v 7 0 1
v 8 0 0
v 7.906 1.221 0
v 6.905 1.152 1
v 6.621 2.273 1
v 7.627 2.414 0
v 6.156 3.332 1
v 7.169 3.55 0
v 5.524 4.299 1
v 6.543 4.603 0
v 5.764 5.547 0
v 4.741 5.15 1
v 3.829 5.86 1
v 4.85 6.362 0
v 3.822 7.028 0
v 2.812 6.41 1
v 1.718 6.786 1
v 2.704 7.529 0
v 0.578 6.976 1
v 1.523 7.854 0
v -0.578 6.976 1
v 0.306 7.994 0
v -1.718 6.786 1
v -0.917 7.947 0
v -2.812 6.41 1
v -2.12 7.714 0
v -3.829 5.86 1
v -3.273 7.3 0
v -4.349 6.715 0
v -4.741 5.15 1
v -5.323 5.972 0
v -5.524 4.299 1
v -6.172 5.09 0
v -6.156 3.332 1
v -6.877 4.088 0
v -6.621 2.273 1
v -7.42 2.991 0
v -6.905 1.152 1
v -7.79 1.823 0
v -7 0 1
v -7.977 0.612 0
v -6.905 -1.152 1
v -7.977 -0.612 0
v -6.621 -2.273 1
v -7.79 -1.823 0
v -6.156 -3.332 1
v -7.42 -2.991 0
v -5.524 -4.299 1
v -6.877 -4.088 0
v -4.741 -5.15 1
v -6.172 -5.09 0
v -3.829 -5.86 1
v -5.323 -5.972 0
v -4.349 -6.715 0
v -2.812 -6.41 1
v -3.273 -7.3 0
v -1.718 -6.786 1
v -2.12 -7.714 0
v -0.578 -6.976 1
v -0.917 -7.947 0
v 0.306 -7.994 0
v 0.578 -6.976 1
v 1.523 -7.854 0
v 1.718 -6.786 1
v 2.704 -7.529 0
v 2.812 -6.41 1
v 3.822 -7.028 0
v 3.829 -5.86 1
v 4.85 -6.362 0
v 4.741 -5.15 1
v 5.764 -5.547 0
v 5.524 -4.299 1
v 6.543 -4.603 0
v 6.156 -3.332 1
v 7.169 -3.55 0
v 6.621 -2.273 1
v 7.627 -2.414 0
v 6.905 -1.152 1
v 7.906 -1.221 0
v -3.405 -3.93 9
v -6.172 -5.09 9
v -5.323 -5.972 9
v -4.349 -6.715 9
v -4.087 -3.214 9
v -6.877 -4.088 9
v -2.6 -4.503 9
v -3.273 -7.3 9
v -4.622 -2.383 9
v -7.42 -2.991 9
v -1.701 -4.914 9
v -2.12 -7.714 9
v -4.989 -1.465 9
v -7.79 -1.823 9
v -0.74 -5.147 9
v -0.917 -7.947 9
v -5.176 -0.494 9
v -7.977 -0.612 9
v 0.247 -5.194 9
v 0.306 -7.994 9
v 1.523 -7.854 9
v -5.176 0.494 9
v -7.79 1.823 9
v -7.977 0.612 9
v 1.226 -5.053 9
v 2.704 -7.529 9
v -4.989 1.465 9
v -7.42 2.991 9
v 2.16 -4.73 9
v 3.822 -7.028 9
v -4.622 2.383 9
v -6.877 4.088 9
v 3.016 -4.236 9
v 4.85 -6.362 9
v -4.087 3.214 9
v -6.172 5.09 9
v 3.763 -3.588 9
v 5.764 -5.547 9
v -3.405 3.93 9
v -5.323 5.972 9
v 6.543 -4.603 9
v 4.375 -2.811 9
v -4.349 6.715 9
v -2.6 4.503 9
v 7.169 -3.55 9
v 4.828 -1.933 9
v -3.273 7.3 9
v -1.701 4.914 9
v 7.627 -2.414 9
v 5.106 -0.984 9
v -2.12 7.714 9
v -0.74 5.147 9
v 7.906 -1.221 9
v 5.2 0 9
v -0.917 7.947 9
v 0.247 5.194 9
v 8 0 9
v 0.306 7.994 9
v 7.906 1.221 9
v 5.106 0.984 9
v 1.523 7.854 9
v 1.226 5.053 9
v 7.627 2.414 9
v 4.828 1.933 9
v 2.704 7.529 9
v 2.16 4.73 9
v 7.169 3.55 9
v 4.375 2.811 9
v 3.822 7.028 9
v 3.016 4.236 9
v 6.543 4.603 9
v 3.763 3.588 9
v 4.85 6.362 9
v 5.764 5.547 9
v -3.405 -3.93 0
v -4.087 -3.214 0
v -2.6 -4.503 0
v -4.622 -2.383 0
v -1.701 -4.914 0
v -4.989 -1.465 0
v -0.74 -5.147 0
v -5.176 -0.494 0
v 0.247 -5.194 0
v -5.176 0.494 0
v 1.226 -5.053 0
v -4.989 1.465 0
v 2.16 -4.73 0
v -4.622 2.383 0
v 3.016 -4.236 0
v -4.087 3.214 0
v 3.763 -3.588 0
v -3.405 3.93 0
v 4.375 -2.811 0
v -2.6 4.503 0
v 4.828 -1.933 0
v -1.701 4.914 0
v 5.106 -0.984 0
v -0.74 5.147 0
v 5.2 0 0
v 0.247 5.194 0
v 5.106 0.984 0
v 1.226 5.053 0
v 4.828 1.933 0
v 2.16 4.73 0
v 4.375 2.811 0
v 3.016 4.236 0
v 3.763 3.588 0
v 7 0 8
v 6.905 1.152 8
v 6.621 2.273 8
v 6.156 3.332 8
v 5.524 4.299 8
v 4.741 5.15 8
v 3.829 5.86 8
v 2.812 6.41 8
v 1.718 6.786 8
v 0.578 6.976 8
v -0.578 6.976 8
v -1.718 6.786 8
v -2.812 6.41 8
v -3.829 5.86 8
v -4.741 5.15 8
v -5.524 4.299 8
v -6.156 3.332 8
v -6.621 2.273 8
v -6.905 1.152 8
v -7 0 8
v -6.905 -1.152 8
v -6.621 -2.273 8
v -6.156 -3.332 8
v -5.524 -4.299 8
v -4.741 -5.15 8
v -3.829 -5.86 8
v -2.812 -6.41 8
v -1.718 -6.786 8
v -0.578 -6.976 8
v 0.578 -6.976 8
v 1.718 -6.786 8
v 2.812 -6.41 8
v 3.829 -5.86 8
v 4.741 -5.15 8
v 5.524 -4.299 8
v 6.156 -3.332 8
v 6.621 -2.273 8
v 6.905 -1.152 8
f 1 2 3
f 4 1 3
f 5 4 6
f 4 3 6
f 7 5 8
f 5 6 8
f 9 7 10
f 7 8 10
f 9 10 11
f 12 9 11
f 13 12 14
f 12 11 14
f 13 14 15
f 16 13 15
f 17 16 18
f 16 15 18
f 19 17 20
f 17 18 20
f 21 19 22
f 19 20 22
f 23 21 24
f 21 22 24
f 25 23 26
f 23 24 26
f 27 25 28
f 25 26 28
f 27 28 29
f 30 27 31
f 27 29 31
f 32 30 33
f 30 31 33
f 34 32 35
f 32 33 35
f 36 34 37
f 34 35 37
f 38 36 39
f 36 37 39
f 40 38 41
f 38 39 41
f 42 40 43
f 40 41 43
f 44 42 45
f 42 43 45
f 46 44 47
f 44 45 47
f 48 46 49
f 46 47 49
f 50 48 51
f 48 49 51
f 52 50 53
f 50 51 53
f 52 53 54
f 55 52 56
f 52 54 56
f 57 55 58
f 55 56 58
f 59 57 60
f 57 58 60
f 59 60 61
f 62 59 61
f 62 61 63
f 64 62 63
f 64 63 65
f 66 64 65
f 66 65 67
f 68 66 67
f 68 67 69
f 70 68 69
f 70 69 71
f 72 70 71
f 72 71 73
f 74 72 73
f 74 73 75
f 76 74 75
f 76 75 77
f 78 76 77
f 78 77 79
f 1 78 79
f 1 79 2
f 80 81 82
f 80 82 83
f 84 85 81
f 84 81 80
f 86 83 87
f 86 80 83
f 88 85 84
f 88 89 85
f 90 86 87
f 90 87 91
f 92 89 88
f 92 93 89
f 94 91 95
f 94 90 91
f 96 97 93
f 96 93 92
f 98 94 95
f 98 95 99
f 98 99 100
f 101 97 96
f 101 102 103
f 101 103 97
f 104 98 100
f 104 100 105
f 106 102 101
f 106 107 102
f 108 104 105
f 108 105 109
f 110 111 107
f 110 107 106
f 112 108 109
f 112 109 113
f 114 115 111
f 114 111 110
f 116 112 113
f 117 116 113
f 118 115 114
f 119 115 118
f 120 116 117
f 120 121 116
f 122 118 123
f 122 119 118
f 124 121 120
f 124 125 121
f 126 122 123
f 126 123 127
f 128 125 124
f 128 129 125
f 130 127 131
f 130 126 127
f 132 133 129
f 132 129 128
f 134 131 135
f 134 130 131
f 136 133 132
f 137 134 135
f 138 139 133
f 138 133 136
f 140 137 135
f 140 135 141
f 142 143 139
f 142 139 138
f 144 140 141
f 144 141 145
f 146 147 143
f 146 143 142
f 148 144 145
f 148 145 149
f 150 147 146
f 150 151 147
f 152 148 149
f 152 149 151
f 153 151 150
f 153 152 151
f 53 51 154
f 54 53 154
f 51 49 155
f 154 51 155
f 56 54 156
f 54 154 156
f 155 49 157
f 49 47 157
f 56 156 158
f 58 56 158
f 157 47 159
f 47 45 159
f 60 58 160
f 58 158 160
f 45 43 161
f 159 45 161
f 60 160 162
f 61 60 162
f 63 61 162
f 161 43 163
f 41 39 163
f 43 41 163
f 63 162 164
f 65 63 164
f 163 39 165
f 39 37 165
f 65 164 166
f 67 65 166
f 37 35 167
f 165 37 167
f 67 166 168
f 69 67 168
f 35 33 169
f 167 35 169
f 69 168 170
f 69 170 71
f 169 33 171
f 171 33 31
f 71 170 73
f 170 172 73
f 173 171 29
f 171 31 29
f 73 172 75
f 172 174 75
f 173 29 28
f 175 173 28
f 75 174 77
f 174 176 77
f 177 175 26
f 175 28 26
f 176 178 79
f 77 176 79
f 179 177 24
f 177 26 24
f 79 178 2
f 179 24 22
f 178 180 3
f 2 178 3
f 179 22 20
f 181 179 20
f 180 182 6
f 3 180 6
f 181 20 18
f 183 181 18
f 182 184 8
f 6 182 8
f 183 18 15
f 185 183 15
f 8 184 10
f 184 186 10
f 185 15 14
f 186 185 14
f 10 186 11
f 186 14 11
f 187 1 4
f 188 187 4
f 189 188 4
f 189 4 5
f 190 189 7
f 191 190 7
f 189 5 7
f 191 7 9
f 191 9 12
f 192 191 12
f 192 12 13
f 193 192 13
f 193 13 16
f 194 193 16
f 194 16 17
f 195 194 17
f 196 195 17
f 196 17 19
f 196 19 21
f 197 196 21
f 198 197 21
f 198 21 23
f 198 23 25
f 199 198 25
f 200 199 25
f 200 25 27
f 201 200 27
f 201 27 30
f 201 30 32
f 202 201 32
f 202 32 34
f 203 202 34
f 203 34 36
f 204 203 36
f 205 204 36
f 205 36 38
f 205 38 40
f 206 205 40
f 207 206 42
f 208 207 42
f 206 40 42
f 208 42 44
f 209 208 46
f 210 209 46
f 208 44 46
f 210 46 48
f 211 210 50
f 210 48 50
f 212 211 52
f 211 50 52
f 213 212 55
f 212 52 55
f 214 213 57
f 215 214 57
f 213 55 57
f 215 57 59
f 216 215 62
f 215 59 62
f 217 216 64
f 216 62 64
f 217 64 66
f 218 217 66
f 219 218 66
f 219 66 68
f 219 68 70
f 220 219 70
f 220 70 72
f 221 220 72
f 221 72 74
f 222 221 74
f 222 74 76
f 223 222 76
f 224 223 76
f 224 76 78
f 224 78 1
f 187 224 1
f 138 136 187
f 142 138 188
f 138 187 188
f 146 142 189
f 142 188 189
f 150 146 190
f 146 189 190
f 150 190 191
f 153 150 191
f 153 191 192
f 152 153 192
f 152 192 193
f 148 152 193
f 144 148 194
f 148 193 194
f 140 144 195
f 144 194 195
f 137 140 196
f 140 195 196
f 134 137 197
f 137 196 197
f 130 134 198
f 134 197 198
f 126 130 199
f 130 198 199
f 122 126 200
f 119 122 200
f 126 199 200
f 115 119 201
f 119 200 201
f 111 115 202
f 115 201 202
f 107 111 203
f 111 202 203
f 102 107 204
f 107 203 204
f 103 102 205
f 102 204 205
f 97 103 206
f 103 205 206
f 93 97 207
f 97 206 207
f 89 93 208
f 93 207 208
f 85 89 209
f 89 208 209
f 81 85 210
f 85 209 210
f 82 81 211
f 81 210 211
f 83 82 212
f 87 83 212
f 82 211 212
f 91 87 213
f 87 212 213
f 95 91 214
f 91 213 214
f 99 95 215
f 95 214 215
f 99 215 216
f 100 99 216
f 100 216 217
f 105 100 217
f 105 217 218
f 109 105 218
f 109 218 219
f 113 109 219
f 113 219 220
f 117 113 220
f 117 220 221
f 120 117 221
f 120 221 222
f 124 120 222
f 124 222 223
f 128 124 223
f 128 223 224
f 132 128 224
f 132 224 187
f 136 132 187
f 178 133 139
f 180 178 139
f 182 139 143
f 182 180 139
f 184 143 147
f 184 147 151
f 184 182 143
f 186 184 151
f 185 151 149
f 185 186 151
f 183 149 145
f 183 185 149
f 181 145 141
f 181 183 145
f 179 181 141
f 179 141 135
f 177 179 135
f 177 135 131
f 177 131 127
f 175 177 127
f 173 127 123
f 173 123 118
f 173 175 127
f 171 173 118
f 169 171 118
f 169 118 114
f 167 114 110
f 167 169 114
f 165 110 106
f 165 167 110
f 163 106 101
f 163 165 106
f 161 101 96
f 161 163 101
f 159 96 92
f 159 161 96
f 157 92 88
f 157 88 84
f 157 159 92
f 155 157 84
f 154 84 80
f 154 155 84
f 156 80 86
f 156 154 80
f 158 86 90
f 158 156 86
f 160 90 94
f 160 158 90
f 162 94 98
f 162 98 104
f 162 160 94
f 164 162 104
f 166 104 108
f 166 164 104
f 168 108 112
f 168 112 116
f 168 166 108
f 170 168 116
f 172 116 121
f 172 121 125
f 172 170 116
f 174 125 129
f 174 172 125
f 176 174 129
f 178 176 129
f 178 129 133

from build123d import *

# Parameters (mm, degrees)
F0_R     = 7
F0_R_2   = 5.2
F1_DEPTH = 9
F0_R_3   = 8
F2_DEPTH = 1
F3_R     = 8
F3_R_2   = 7
F4_DEPTH = 1
F5_SIZE  = 0.99999


# Not quite as in the source:
# - a fillet or chamfer is up to 0.001 mm smaller than in the source, because OpenCascade refuses the exact size


with BuildPart() as f1:
    # F0 (on Top) → F1 (new body)
    with BuildSketch(Plane.XY):
        Circle(F0_R)
        Circle(F0_R_2, mode=Mode.SUBTRACT)
    extrude(amount=F1_DEPTH)

    # F0 (on Top) → F2 (join)
    with BuildSketch(Plane.XY):
        Circle(F0_R_3)
        Circle(F0_R, mode=Mode.SUBTRACT)
    extrude(amount=F2_DEPTH)

    # F3 (on face) → F4 (join)
    with BuildSketch(Plane.XY.offset(9)):
        Circle(F3_R)
        Circle(F3_R_2, mode=Mode.SUBTRACT)
    extrude(amount=-F4_DEPTH)

    # F5 (size 1 in the source; OpenCascade refuses exactly that, so slightly less here)
    f5_edges = [f1.edges().sort_by_distance(p)[0] for p in [
        (-8, 0, 8),
        (-8, 0, 1),
    ]]
    chamfer(f5_edges, length=F5_SIZE)


solid = f1.part
